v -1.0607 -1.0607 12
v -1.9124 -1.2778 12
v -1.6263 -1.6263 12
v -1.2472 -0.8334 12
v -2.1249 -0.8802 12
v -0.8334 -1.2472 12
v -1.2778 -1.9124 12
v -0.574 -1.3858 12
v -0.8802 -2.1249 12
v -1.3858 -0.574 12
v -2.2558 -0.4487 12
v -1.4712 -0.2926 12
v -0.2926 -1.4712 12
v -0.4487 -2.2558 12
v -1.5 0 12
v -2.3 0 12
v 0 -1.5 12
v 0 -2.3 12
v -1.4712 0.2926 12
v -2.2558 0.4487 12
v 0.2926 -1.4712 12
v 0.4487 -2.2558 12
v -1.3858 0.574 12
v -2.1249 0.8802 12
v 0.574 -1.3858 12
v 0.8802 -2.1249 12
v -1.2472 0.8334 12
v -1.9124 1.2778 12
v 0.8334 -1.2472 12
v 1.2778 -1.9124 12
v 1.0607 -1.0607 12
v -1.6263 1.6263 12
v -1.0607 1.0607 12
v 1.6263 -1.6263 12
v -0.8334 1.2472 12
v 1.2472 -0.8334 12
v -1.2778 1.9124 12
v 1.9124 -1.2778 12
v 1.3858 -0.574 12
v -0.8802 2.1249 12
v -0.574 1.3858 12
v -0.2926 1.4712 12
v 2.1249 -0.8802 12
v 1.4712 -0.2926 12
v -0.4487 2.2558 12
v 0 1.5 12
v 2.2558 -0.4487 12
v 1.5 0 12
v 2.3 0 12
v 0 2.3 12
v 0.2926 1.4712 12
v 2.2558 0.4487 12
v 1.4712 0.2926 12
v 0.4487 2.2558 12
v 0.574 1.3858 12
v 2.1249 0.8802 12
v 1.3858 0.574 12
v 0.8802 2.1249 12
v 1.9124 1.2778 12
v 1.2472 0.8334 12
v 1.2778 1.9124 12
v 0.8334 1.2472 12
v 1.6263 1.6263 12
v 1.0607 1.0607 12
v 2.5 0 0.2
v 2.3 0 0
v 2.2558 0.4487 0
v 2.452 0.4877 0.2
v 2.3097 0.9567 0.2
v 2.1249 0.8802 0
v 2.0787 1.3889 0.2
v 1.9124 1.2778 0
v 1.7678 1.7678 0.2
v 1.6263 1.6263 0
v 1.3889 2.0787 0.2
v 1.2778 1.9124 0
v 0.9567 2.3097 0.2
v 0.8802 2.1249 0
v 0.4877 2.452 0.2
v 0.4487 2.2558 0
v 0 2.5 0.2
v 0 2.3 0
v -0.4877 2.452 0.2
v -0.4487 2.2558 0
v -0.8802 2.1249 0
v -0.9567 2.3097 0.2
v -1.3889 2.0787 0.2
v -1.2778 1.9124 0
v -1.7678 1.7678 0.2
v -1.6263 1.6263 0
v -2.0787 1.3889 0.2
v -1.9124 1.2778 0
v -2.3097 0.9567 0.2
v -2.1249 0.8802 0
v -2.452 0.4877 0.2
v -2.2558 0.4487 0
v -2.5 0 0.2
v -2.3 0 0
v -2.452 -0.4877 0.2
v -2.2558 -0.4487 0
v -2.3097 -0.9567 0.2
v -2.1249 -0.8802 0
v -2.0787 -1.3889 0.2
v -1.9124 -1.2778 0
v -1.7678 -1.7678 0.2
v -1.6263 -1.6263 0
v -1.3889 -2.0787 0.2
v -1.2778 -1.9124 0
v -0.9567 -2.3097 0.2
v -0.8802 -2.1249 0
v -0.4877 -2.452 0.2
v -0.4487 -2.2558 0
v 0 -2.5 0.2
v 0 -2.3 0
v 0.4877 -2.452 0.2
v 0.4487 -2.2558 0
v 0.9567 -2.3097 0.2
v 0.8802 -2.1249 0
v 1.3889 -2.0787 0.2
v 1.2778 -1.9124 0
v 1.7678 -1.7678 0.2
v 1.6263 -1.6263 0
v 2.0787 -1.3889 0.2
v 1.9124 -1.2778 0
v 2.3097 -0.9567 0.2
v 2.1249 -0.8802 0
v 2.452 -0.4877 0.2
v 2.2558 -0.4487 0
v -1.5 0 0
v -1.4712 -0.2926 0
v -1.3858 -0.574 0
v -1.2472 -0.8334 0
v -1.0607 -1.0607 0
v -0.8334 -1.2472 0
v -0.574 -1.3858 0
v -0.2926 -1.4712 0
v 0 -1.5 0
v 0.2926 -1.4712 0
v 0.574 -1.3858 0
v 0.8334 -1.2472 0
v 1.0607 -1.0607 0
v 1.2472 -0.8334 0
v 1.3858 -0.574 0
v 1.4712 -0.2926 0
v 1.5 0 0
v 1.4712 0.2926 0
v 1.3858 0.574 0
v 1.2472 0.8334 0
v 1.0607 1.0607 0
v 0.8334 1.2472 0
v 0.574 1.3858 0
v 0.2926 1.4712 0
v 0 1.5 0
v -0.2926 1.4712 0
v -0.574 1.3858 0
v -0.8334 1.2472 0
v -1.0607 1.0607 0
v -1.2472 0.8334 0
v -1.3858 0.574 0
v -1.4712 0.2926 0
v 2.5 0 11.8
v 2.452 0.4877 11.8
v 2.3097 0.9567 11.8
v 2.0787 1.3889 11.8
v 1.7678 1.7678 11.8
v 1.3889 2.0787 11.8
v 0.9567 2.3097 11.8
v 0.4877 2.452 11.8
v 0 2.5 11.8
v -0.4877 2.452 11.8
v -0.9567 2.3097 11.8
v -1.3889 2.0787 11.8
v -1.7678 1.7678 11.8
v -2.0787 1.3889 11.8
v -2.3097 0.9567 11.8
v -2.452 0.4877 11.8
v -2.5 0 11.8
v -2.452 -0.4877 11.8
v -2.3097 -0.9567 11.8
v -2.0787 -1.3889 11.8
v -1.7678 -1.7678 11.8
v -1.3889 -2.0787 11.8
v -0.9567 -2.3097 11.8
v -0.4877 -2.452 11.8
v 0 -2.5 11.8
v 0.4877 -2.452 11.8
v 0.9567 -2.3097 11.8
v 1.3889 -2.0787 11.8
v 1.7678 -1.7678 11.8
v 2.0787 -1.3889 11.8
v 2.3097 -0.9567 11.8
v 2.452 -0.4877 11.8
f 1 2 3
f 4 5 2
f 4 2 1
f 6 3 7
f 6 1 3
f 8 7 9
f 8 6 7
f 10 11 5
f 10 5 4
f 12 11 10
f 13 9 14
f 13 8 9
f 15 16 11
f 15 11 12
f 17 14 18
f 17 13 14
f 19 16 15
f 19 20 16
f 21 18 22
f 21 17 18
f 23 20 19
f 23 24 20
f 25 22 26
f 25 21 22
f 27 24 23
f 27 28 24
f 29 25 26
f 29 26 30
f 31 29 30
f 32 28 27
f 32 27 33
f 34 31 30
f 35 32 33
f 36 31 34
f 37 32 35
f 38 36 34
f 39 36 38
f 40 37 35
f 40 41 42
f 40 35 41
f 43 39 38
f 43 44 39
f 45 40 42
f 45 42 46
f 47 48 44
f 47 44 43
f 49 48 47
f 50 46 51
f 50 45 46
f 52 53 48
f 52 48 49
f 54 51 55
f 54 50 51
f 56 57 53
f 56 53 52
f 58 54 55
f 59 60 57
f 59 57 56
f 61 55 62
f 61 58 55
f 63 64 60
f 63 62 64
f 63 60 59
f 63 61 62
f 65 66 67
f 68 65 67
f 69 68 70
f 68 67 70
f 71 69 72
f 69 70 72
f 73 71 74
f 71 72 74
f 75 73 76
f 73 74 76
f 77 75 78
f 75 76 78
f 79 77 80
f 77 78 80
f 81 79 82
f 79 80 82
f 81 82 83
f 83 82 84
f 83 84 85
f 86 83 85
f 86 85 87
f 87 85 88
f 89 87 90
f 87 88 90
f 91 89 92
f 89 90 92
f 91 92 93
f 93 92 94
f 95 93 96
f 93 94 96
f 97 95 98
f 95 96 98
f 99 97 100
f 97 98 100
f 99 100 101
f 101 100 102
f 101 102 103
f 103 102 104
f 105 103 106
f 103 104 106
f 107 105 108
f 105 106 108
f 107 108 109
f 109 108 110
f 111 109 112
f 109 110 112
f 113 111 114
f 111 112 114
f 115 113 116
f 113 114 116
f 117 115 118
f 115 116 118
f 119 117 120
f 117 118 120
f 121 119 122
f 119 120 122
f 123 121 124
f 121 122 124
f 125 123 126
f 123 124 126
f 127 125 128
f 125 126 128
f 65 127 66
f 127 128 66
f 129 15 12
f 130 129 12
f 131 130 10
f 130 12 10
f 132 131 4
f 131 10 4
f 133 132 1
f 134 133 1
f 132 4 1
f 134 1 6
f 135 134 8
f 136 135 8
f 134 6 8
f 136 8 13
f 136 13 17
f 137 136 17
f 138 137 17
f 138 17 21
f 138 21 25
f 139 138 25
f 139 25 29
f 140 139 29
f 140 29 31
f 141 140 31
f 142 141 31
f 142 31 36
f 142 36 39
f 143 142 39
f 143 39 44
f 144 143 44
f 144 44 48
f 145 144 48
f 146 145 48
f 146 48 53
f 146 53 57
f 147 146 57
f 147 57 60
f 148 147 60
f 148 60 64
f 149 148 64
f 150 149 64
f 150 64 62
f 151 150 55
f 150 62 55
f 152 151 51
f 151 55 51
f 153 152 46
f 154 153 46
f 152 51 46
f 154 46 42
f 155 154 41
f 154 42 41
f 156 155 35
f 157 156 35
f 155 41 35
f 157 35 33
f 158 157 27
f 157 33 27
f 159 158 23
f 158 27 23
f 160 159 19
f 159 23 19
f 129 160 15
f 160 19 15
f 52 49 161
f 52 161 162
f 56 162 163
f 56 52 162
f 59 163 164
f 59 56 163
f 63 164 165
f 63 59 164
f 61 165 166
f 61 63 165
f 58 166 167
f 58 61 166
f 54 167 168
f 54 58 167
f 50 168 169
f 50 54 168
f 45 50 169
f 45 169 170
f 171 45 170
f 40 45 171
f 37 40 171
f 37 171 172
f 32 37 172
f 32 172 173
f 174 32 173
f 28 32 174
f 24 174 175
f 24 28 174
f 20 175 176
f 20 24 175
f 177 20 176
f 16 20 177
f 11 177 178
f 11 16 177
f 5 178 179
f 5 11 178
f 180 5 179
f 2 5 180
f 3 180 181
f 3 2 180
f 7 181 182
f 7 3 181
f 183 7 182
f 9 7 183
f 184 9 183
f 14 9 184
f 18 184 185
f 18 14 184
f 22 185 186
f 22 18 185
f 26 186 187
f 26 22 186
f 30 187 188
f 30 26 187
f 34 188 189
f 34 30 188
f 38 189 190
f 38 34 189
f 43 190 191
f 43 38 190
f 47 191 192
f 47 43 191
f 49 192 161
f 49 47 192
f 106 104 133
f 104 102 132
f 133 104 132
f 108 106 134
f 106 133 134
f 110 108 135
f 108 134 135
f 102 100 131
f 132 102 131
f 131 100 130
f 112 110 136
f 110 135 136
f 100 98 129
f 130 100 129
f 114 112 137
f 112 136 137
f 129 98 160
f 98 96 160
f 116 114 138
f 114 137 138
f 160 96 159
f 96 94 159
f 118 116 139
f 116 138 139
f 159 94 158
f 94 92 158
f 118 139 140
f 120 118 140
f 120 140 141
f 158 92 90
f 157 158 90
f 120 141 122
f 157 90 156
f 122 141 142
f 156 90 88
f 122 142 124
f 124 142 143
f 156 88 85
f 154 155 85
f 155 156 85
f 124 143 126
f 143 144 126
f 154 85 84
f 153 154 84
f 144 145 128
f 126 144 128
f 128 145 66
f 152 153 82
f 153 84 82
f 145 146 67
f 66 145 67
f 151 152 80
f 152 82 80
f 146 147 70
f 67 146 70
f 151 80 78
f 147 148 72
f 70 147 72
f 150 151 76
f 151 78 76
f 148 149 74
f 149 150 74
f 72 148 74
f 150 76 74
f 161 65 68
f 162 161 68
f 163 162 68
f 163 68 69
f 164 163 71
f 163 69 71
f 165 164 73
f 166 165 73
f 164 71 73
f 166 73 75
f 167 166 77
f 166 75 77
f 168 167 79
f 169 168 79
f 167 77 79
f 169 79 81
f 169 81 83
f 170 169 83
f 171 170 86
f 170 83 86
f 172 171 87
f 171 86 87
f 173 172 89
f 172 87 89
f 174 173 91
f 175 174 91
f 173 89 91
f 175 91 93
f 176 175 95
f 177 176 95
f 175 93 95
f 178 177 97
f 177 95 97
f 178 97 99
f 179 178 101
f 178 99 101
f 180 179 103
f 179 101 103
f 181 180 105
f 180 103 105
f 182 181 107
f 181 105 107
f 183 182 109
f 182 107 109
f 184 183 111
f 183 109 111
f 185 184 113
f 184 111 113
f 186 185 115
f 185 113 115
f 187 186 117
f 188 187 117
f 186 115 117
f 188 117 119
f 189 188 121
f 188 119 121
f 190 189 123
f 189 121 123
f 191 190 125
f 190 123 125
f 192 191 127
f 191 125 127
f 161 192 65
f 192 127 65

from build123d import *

# Parameters (mm, degrees)
F0_R     = 2.5
F1_DEPTH = 12
F2_SIZE  = 0.2
F3_D     = 3


with BuildPart() as f1:
    # F0 (on Top) → F1 (new body)
    with BuildSketch(Plane.XY):
        Circle(F0_R)
    extrude(amount=F1_DEPTH)

    # F2
    f2_edges = [f1.edges().sort_by_distance(p)[0] for p in [
        (-2.5, 0, 12),
        (-2.5, 0, 0),
    ]]
    chamfer(f2_edges, length=F2_SIZE)

    # F3 (through all)
    with Locations(Plane(origin=(0, 0, 0), x_dir=(1, 0, 0), z_dir=(0, 0, -1))):
        with Locations((0, 0)):
            Hole(F3_D / 2)


solid = f1.part
